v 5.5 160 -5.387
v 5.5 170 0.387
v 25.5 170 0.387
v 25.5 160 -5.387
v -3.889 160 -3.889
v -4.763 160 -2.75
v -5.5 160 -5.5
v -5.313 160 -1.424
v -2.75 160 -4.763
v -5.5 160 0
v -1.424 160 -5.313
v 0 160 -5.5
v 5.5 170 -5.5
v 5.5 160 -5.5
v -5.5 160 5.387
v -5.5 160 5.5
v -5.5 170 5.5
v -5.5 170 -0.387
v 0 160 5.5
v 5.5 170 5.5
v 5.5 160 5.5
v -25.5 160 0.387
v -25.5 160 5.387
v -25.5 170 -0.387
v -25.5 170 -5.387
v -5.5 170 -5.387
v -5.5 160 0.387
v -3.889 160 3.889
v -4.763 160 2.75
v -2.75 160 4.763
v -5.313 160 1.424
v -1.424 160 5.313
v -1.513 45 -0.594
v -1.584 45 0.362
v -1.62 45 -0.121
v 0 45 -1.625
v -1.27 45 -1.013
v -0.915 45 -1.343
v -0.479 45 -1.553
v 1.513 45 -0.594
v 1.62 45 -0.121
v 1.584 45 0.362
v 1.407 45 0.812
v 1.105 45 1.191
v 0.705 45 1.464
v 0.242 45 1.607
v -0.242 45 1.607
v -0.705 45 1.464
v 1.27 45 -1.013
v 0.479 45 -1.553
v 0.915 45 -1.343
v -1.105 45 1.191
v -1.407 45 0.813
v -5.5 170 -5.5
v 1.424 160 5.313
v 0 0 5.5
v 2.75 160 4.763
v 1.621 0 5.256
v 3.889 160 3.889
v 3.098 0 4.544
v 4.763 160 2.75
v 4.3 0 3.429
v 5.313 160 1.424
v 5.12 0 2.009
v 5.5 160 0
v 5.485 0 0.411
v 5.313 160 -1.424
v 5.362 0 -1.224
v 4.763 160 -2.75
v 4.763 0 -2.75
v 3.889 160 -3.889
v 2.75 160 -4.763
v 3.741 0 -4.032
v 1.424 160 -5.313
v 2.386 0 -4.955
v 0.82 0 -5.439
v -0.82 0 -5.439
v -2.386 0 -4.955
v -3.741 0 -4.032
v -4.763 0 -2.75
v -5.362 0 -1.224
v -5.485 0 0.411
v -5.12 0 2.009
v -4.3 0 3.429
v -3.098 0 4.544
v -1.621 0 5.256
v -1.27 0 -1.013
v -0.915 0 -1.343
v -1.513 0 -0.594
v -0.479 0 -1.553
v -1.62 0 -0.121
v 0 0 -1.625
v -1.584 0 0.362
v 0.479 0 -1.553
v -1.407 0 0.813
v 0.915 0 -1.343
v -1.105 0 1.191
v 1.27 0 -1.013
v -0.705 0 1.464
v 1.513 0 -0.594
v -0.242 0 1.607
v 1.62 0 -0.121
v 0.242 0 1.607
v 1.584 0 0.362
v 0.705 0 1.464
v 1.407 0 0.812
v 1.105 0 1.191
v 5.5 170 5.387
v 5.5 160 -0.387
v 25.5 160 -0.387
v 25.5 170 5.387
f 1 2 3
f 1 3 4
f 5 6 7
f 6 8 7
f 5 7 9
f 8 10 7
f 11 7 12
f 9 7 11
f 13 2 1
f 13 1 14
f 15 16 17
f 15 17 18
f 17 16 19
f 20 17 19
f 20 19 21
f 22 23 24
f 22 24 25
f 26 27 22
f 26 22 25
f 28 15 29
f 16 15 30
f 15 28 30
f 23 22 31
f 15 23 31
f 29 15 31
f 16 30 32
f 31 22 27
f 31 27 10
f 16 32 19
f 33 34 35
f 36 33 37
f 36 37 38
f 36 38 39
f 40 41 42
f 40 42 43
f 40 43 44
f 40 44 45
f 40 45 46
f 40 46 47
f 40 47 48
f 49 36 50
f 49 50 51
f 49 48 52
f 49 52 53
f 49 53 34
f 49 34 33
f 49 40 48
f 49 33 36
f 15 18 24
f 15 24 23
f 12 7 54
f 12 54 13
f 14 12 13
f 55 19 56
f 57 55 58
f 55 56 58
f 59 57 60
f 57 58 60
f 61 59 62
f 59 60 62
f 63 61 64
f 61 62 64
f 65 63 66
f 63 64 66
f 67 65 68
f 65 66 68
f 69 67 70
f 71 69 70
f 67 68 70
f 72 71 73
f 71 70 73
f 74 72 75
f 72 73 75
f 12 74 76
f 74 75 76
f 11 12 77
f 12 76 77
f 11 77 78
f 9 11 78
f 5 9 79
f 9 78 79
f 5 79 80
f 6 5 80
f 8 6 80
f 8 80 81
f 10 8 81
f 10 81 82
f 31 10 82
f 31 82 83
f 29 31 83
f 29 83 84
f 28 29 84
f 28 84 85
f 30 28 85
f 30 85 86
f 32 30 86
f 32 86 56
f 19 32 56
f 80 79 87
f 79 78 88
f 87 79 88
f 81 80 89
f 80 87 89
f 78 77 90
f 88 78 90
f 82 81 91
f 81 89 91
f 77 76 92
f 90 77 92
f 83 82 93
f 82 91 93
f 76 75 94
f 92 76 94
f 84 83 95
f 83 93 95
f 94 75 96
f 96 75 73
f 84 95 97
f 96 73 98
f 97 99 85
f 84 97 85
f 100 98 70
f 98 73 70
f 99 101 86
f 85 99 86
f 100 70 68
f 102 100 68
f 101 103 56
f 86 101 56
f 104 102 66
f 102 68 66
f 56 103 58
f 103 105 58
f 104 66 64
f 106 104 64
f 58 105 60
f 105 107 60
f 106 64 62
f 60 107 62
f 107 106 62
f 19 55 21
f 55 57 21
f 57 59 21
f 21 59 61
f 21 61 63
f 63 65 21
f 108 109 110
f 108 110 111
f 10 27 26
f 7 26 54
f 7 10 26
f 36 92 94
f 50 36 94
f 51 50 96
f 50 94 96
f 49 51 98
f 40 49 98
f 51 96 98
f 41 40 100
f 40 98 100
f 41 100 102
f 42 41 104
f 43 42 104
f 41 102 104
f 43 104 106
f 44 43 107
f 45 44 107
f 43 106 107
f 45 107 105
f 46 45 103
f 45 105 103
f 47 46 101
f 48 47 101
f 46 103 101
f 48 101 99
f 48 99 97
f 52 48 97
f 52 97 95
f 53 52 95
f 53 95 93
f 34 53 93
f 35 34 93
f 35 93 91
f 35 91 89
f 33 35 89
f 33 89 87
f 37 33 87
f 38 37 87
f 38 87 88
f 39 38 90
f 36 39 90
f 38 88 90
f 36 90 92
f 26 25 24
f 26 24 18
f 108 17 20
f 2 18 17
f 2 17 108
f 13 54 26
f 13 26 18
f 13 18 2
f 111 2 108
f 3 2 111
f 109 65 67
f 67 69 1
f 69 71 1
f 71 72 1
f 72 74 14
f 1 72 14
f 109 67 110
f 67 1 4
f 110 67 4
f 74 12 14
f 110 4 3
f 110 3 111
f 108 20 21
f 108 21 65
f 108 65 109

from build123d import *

# Parameters (mm, degrees)
SKETCH1_R           = 5.5
BOSS_EXTRUDE1_DEPTH = 160
SKETCH2_W           = 11
SKETCH2_H           = 11
BOSS_EXTRUDE2_DEPTH = 10
BOSS_EXTRUDE3_DEPTH = 20
CIRPATTERN1_COUNT   = 2
SKETCH4_R           = 1.625
CUT_EXTRUDE1_DEPTH  = 45


with BuildPart() as part:
    # Sketch1 → Boss-Extrude1 (new body)
    with BuildSketch(Plane(origin=(0, 0, 0), x_dir=(1, 0, 0), z_dir=(0, 1, 0))):
        with Locations(Location((0, 0, 0), (0, 0, 270))):
            Circle(SKETCH1_R)
    extrude(amount=BOSS_EXTRUDE1_DEPTH)

    # Sketch2 → Boss-Extrude2 (add)
    with BuildSketch(Plane(origin=(0, 160, 0), x_dir=(1, 0, 0), z_dir=(0, 1, 0))):
        Rectangle(SKETCH2_W, SKETCH2_H)
    extrude(amount=BOSS_EXTRUDE2_DEPTH)

    # Sketch3 → Boss-Extrude3 (add)
    with BuildSketch(Plane.ZY.offset(5.5)):
        Polygon((-5.386751346, 170), (-0.386751346, 170), (5.386751346, 160), (0.386751346, 160), align=None)
    boss_extrude3 = extrude(amount=BOSS_EXTRUDE3_DEPTH)

    # CirPattern1: Boss-Extrude3 ×2 about axis
    cirpattern1_axis = Axis((0, 0, 0), (0, 1, 0))
    for i in range(1, CIRPATTERN1_COUNT):
        add(boss_extrude3.rotate(cirpattern1_axis, i * 360 / CIRPATTERN1_COUNT))

    # Sketch4 → Cut-Extrude1 (cut)
    with BuildSketch(Plane.XZ):
        with Locations(Location((0, 0, 0), (0, 0, 270))):
            Circle(SKETCH4_R)
    extrude(amount=-CUT_EXTRUDE1_DEPTH, mode=Mode.SUBTRACT)


solid = part.part
